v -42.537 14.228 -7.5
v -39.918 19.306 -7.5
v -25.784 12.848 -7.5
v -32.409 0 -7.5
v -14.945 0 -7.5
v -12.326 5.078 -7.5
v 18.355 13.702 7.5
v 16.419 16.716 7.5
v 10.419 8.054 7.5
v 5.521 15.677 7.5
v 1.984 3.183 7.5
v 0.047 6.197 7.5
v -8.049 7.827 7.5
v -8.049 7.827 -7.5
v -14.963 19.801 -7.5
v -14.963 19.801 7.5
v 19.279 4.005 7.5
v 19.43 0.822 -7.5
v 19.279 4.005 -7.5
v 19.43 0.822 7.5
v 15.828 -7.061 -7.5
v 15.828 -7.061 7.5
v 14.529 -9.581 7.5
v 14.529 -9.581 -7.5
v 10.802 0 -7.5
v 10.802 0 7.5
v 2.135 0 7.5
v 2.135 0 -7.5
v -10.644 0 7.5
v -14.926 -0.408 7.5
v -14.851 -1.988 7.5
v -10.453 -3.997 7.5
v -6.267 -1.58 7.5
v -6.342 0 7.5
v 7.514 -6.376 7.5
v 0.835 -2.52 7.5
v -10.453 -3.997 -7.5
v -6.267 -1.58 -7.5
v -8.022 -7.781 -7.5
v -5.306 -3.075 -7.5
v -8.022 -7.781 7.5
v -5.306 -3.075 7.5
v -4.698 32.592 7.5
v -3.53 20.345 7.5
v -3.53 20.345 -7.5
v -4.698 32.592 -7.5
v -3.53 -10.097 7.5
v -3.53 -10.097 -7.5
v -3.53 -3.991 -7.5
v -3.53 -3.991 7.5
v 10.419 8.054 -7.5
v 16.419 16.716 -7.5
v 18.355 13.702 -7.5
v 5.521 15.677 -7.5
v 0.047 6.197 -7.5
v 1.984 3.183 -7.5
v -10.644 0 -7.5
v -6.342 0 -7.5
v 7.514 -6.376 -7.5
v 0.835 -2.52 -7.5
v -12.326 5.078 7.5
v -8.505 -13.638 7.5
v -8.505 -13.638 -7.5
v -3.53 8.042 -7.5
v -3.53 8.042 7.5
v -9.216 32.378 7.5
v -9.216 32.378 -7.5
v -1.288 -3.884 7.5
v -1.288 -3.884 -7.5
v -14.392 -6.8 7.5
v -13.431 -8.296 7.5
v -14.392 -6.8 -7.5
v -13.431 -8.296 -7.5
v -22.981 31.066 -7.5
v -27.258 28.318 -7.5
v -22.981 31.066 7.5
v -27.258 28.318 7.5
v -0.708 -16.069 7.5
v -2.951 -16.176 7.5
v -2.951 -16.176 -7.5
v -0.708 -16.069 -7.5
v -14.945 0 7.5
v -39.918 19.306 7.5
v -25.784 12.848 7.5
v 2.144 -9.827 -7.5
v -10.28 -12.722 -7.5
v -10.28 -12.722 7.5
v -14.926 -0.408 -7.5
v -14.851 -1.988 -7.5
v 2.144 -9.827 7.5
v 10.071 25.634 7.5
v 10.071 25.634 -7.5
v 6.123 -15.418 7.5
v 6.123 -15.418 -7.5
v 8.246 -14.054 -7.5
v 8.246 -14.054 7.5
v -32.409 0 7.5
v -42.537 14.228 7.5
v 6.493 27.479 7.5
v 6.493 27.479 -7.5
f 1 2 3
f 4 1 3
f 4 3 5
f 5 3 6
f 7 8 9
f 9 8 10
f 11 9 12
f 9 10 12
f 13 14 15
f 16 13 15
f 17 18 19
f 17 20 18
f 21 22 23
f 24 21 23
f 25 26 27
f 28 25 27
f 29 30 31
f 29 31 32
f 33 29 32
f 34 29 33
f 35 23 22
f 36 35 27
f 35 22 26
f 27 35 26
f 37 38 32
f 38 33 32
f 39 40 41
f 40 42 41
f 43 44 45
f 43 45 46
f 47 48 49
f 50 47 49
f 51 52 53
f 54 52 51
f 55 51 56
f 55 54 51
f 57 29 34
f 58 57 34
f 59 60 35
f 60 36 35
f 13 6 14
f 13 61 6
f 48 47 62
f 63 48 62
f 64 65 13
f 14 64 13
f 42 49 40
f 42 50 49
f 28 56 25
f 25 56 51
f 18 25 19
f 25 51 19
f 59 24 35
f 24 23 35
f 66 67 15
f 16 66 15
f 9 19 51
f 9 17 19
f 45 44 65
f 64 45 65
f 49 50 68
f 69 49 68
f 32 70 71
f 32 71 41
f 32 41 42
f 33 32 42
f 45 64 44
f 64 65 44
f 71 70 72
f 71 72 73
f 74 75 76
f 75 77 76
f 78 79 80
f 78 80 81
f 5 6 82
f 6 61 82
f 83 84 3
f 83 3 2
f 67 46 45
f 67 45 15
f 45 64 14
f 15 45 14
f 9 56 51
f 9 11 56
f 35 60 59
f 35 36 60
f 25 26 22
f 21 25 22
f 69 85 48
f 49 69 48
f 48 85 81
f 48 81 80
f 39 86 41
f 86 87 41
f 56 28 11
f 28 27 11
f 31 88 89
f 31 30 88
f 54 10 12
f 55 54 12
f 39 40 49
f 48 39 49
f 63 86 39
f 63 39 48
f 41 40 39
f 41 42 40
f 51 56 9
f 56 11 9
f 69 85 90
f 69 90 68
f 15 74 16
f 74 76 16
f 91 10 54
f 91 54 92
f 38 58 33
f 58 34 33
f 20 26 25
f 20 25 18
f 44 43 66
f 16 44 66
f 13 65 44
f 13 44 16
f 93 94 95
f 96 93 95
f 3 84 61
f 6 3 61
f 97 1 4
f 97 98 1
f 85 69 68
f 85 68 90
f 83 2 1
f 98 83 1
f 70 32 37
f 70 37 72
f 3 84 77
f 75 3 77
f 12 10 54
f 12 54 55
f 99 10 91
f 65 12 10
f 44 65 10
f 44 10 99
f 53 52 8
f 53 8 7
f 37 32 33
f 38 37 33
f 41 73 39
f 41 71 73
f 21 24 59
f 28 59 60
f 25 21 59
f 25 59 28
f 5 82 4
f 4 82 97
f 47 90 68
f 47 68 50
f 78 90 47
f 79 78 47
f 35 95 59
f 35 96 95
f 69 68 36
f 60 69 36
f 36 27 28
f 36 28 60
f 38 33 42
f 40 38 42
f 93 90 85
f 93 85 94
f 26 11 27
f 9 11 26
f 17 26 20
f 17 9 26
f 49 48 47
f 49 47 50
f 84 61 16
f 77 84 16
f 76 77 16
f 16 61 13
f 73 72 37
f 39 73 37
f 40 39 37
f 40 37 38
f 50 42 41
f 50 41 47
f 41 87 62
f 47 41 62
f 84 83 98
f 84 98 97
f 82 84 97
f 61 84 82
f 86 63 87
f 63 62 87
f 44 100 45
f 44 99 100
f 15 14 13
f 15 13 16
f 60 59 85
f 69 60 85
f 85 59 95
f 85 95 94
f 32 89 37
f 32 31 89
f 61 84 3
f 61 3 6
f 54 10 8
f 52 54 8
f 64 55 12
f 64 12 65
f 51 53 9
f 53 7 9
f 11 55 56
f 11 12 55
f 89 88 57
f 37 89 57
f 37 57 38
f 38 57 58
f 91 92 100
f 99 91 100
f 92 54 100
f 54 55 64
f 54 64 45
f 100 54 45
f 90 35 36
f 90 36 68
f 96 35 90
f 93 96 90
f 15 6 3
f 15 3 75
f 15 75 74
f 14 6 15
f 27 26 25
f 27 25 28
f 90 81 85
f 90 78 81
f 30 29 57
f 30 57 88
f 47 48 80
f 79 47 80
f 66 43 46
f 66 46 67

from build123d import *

# Parameters (mm, degrees)
BOSS_EXTRU_1_DEPTH  = 7.5
BOSS_EXTRU_3_DEPTH  = 7.5
BOSS_EXTRU_4_DEPTH  = 7.5
BOSS_EXTRU_5_DEPTH  = 7.5
BOSS_EXTRU_6_DEPTH  = 7.5
BOSS_EXTRU_7_DEPTH  = 7.5
BOSS_EXTRU_8_DEPTH  = 7.5
BOSS_EXTRU_9_DEPTH  = 7.5
BOSS_EXTRU_10_DEPTH = 7.5
BOSS_EXTRU_11_DEPTH = 7.5
BOSS_EXTRU_12_DEPTH = 7.5
BOSS_EXTRU_13_DEPTH = 7.5


with BuildPart() as part:
    # Esquisse20 → Boss.-Extru.1 (new body, symmetric)
    with BuildSketch(Plane.XY):
        Polygon((-10.643517195, 0), (-6.341984433, 0), (-6.266871728, -1.579960424), (-10.453473573, -3.997096126), align=None)
    extrude(amount=BOSS_EXTRU_1_DEPTH, both=True)

    # Symétrie1: part across plane


with BuildPart() as body_2:
    # Esquisse21 → Boss.-Extru.3 (new body, symmetric)
    with BuildSketch(Plane.XY):
        Polygon((-5.305934527, -3.075489216), (-8.022456613, -7.780643489), (-3.5303, -10.097081162), (-3.5303, -3.991068195), align=None)
    extrude(amount=BOSS_EXTRU_3_DEPTH, both=True)

    # Symétrie3: body 2 across plane


with BuildPart() as body_3:
    # Esquisse22 → Boss.-Extru.4 (new body, symmetric)
    with BuildSketch(Plane.XY):
        Polygon((-6.266871728, -1.579960424), (-5.305934527, -3.075489216), (-8.022456613, -7.780643489), (-10.453473573, -3.997096126), align=None)
    extrude(amount=BOSS_EXTRU_4_DEPTH, both=True)

    # Symétrie2: body 3 across plane


with BuildPart() as body_4:
    # Esquisse23 → Boss.-Extru.5 (new body, symmetric)
    with BuildSketch(Plane.XY):
        Polygon((-3.5303, -3.991068195), (-1.287686712, -3.884320156), (2.143508969, -9.827325407), (-3.5303, -10.097081162), align=None)
    extrude(amount=BOSS_EXTRU_5_DEPTH, both=True)

    # Symétrie4: body 4 across plane


with BuildPart() as body_5:
    # Esquisse24 → Boss.-Extru.6 (new body, symmetric)
    with BuildSketch(Plane.XY):
        Polygon((-1.287686712, -3.884320156), (0.835256513, -2.520455228), (7.51412158, -6.376499772), (2.143508969, -9.827325407), align=None)
    extrude(amount=BOSS_EXTRU_6_DEPTH, both=True)

    # Symétrie5: body 5 across plane


with BuildPart() as body_6:
    # Esquisse25 → Boss.-Extru.7 (new body, symmetric)
    with BuildSketch(Plane.XY):
        Polygon((7.51412158, -6.376499772), (10.80205889, 0), (2.134947016, 0), (0.835256513, -2.520455228), align=None)
    extrude(amount=BOSS_EXTRU_7_DEPTH, both=True)

    # Symétrie6: body 6 across plane


with BuildPart() as body_7:
    # Esquisse26 → Boss.-Extru.8 (new body, symmetric)
    with BuildSketch(Plane.XY):
        Polygon((10.80205889, 0), (2.134947016, 0), (1.983545978, 3.18342046), (10.419255773, 8.053779781), align=None)
    extrude(amount=BOSS_EXTRU_8_DEPTH, both=True)

    # Symétrie7: body 7 across plane


with BuildPart() as body_8:
    # Esquisse27 → Boss.-Extru.9 (new body, symmetric)
    with BuildSketch(Plane.XY):
        Polygon((1.983545978, 3.18342046), (10.419255773, 8.053779781), (5.521013255, 15.677334433), (0.047387798, 6.19673704), align=None)
    extrude(amount=BOSS_EXTRU_9_DEPTH, both=True)

    # Symétrie8: body 8 across plane


with BuildPart() as body_9:
    # Esquisse28 → Boss.-Extru.10 (new body, symmetric)
    with BuildSketch(Plane.XY):
        Polygon((0.047387798, 6.19673704), (-3.5303, 8.041696023), (-3.5303, 20.344722064), (5.521013255, 15.677334433), align=None)
    extrude(amount=BOSS_EXTRU_10_DEPTH, both=True)

    # Symétrie9: body 9 across plane


with BuildPart() as body_10:
    # Esquisse29 → Boss.-Extru.11 (new body, symmetric)
    with BuildSketch(Plane.XY):
        Polygon((-3.5303, 8.041696023), (-8.049083477, 7.82676257), (-14.962524173, 19.801193112), (-3.5303, 20.344722064), align=None)
    extrude(amount=BOSS_EXTRU_11_DEPTH, both=True)

    # Symétrie10: body 10 across plane


with BuildPart() as body_11:
    # Esquisse30 → Boss.-Extru.12 (new body, symmetric)
    with BuildSketch(Plane.XY):
        Polygon((-8.049083477, 7.82676257), (-14.962524173, 19.801193112), (-25.783924084, 12.848135855), (-12.326158681, 5.078291377), align=None)
    extrude(amount=BOSS_EXTRU_12_DEPTH, both=True)

    # Symétrie11: body 11 across plane


with BuildPart() as body_12:
    # Esquisse31 → Boss.-Extru.13 (new body, symmetric)
    with BuildSketch(Plane.XY):
        Polygon((-25.783924084, 12.848135855), (-12.326158681, 5.078291377), (-14.945224597, 0), (-32.409116649, 0), align=None)
    extrude(amount=BOSS_EXTRU_13_DEPTH, both=True)

    # Symétrie12: body 12 across plane


with BuildPart() as part_1:
    add(part.part)
    add(part.part.mirror(Plane(origin=(-10.453473573, -3.997096126, 7.5), x_dir=(0, 0, 1), z_dir=(-0.998871629, -0.047491773, 0))))


with BuildPart() as body_3_1:
    add(body_3.part)
    add(body_3.part.mirror(Plane(origin=(-8.022456613, -7.780643489, 7.5), x_dir=(0, 0, 1), z_dir=(0.841306248, 0.540558783, 0))))


with BuildPart() as body_2_1:
    add(body_2.part)
    add(body_2.part.mirror(Plane(origin=(-8.022456613, -7.780643489, 7.5), x_dir=(0, 0, 1), z_dir=(0.458315613, 0.888789513, 0))))


with BuildPart() as body_4_1:
    add(body_4.part)
    add(body_4.part.mirror(Plane(origin=(2.143508969, -9.827325407, 7.5), x_dir=(0, 0, 1), z_dir=(-0.047490388, 0.998871695, 0))))


with BuildPart() as body_5_1:
    add(body_5.part)
    add(body_5.part.mirror(Plane(origin=(7.51412158, -6.376499772, 7.5), x_dir=(0, 0, 1), z_dir=(-0.540567922, 0.841300375, 0))))


with BuildPart() as body_6_1:
    add(body_6.part)
    add(body_6.part.mirror(Plane(origin=(7.51412158, -6.376499772, 7.5), x_dir=(0, 0, 1), z_dir=(-0.888800067, 0.458295147, 0))))


with BuildPart() as body_7_1:
    add(body_7.part)
    add(body_7.part.mirror(Plane(origin=(10.419255773, 8.053779781, 7.5), x_dir=(0, 0, 1), z_dir=(-0.998872319, -0.047477265, 0))))


with BuildPart() as body_8_1:
    add(body_8.part)
    add(body_8.part.mirror(Plane(origin=(10.419255773, 8.053779781, 7.5), x_dir=(0, 0, 1), z_dir=(-0.841309671, -0.540553454, 0))))


with BuildPart() as body_9_1:
    add(body_9.part)
    add(body_9.part.mirror(Plane(origin=(-3.5303, 20.344722064, 7.5), x_dir=(0, 0, 1), z_dir=(-0.458312733, -0.888790999, 0))))


with BuildPart() as body_10_1:
    add(body_10.part)
    add(body_10.part.mirror(Plane(origin=(-14.962524173, 19.801193112, 7.5), x_dir=(0, 0, 1), z_dir=(0.047489945, -0.998871716, 0))))


with BuildPart() as body_11_1:
    add(body_11.part)
    add(body_11.part.mirror(Plane(origin=(-14.962524173, 19.801193112, 7.5), x_dir=(0, 0, 1), z_dir=(0.540561906, -0.841304241, 0))))


with BuildPart() as body_12_1:
    add(body_12.part)
    add(body_12.part.mirror(Plane(origin=(-32.409116649, 0, 7.5), x_dir=(0, 0, 1), z_dir=(0.888792671, -0.45830949, 0))))


solid = Compound([part_1.part, body_3_1.part, body_2_1.part, body_4_1.part, body_5_1.part, body_6_1.part, body_7_1.part, body_8_1.part, body_9_1.part, body_10_1.part, body_11_1.part, body_12_1.part])
